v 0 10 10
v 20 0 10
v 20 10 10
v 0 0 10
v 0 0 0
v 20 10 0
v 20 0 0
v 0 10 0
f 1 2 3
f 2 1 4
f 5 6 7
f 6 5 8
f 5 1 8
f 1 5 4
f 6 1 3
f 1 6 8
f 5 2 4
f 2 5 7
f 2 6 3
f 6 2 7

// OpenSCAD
color("red") cube(10);
color("red") translate([10,0,0]) cube(10);
